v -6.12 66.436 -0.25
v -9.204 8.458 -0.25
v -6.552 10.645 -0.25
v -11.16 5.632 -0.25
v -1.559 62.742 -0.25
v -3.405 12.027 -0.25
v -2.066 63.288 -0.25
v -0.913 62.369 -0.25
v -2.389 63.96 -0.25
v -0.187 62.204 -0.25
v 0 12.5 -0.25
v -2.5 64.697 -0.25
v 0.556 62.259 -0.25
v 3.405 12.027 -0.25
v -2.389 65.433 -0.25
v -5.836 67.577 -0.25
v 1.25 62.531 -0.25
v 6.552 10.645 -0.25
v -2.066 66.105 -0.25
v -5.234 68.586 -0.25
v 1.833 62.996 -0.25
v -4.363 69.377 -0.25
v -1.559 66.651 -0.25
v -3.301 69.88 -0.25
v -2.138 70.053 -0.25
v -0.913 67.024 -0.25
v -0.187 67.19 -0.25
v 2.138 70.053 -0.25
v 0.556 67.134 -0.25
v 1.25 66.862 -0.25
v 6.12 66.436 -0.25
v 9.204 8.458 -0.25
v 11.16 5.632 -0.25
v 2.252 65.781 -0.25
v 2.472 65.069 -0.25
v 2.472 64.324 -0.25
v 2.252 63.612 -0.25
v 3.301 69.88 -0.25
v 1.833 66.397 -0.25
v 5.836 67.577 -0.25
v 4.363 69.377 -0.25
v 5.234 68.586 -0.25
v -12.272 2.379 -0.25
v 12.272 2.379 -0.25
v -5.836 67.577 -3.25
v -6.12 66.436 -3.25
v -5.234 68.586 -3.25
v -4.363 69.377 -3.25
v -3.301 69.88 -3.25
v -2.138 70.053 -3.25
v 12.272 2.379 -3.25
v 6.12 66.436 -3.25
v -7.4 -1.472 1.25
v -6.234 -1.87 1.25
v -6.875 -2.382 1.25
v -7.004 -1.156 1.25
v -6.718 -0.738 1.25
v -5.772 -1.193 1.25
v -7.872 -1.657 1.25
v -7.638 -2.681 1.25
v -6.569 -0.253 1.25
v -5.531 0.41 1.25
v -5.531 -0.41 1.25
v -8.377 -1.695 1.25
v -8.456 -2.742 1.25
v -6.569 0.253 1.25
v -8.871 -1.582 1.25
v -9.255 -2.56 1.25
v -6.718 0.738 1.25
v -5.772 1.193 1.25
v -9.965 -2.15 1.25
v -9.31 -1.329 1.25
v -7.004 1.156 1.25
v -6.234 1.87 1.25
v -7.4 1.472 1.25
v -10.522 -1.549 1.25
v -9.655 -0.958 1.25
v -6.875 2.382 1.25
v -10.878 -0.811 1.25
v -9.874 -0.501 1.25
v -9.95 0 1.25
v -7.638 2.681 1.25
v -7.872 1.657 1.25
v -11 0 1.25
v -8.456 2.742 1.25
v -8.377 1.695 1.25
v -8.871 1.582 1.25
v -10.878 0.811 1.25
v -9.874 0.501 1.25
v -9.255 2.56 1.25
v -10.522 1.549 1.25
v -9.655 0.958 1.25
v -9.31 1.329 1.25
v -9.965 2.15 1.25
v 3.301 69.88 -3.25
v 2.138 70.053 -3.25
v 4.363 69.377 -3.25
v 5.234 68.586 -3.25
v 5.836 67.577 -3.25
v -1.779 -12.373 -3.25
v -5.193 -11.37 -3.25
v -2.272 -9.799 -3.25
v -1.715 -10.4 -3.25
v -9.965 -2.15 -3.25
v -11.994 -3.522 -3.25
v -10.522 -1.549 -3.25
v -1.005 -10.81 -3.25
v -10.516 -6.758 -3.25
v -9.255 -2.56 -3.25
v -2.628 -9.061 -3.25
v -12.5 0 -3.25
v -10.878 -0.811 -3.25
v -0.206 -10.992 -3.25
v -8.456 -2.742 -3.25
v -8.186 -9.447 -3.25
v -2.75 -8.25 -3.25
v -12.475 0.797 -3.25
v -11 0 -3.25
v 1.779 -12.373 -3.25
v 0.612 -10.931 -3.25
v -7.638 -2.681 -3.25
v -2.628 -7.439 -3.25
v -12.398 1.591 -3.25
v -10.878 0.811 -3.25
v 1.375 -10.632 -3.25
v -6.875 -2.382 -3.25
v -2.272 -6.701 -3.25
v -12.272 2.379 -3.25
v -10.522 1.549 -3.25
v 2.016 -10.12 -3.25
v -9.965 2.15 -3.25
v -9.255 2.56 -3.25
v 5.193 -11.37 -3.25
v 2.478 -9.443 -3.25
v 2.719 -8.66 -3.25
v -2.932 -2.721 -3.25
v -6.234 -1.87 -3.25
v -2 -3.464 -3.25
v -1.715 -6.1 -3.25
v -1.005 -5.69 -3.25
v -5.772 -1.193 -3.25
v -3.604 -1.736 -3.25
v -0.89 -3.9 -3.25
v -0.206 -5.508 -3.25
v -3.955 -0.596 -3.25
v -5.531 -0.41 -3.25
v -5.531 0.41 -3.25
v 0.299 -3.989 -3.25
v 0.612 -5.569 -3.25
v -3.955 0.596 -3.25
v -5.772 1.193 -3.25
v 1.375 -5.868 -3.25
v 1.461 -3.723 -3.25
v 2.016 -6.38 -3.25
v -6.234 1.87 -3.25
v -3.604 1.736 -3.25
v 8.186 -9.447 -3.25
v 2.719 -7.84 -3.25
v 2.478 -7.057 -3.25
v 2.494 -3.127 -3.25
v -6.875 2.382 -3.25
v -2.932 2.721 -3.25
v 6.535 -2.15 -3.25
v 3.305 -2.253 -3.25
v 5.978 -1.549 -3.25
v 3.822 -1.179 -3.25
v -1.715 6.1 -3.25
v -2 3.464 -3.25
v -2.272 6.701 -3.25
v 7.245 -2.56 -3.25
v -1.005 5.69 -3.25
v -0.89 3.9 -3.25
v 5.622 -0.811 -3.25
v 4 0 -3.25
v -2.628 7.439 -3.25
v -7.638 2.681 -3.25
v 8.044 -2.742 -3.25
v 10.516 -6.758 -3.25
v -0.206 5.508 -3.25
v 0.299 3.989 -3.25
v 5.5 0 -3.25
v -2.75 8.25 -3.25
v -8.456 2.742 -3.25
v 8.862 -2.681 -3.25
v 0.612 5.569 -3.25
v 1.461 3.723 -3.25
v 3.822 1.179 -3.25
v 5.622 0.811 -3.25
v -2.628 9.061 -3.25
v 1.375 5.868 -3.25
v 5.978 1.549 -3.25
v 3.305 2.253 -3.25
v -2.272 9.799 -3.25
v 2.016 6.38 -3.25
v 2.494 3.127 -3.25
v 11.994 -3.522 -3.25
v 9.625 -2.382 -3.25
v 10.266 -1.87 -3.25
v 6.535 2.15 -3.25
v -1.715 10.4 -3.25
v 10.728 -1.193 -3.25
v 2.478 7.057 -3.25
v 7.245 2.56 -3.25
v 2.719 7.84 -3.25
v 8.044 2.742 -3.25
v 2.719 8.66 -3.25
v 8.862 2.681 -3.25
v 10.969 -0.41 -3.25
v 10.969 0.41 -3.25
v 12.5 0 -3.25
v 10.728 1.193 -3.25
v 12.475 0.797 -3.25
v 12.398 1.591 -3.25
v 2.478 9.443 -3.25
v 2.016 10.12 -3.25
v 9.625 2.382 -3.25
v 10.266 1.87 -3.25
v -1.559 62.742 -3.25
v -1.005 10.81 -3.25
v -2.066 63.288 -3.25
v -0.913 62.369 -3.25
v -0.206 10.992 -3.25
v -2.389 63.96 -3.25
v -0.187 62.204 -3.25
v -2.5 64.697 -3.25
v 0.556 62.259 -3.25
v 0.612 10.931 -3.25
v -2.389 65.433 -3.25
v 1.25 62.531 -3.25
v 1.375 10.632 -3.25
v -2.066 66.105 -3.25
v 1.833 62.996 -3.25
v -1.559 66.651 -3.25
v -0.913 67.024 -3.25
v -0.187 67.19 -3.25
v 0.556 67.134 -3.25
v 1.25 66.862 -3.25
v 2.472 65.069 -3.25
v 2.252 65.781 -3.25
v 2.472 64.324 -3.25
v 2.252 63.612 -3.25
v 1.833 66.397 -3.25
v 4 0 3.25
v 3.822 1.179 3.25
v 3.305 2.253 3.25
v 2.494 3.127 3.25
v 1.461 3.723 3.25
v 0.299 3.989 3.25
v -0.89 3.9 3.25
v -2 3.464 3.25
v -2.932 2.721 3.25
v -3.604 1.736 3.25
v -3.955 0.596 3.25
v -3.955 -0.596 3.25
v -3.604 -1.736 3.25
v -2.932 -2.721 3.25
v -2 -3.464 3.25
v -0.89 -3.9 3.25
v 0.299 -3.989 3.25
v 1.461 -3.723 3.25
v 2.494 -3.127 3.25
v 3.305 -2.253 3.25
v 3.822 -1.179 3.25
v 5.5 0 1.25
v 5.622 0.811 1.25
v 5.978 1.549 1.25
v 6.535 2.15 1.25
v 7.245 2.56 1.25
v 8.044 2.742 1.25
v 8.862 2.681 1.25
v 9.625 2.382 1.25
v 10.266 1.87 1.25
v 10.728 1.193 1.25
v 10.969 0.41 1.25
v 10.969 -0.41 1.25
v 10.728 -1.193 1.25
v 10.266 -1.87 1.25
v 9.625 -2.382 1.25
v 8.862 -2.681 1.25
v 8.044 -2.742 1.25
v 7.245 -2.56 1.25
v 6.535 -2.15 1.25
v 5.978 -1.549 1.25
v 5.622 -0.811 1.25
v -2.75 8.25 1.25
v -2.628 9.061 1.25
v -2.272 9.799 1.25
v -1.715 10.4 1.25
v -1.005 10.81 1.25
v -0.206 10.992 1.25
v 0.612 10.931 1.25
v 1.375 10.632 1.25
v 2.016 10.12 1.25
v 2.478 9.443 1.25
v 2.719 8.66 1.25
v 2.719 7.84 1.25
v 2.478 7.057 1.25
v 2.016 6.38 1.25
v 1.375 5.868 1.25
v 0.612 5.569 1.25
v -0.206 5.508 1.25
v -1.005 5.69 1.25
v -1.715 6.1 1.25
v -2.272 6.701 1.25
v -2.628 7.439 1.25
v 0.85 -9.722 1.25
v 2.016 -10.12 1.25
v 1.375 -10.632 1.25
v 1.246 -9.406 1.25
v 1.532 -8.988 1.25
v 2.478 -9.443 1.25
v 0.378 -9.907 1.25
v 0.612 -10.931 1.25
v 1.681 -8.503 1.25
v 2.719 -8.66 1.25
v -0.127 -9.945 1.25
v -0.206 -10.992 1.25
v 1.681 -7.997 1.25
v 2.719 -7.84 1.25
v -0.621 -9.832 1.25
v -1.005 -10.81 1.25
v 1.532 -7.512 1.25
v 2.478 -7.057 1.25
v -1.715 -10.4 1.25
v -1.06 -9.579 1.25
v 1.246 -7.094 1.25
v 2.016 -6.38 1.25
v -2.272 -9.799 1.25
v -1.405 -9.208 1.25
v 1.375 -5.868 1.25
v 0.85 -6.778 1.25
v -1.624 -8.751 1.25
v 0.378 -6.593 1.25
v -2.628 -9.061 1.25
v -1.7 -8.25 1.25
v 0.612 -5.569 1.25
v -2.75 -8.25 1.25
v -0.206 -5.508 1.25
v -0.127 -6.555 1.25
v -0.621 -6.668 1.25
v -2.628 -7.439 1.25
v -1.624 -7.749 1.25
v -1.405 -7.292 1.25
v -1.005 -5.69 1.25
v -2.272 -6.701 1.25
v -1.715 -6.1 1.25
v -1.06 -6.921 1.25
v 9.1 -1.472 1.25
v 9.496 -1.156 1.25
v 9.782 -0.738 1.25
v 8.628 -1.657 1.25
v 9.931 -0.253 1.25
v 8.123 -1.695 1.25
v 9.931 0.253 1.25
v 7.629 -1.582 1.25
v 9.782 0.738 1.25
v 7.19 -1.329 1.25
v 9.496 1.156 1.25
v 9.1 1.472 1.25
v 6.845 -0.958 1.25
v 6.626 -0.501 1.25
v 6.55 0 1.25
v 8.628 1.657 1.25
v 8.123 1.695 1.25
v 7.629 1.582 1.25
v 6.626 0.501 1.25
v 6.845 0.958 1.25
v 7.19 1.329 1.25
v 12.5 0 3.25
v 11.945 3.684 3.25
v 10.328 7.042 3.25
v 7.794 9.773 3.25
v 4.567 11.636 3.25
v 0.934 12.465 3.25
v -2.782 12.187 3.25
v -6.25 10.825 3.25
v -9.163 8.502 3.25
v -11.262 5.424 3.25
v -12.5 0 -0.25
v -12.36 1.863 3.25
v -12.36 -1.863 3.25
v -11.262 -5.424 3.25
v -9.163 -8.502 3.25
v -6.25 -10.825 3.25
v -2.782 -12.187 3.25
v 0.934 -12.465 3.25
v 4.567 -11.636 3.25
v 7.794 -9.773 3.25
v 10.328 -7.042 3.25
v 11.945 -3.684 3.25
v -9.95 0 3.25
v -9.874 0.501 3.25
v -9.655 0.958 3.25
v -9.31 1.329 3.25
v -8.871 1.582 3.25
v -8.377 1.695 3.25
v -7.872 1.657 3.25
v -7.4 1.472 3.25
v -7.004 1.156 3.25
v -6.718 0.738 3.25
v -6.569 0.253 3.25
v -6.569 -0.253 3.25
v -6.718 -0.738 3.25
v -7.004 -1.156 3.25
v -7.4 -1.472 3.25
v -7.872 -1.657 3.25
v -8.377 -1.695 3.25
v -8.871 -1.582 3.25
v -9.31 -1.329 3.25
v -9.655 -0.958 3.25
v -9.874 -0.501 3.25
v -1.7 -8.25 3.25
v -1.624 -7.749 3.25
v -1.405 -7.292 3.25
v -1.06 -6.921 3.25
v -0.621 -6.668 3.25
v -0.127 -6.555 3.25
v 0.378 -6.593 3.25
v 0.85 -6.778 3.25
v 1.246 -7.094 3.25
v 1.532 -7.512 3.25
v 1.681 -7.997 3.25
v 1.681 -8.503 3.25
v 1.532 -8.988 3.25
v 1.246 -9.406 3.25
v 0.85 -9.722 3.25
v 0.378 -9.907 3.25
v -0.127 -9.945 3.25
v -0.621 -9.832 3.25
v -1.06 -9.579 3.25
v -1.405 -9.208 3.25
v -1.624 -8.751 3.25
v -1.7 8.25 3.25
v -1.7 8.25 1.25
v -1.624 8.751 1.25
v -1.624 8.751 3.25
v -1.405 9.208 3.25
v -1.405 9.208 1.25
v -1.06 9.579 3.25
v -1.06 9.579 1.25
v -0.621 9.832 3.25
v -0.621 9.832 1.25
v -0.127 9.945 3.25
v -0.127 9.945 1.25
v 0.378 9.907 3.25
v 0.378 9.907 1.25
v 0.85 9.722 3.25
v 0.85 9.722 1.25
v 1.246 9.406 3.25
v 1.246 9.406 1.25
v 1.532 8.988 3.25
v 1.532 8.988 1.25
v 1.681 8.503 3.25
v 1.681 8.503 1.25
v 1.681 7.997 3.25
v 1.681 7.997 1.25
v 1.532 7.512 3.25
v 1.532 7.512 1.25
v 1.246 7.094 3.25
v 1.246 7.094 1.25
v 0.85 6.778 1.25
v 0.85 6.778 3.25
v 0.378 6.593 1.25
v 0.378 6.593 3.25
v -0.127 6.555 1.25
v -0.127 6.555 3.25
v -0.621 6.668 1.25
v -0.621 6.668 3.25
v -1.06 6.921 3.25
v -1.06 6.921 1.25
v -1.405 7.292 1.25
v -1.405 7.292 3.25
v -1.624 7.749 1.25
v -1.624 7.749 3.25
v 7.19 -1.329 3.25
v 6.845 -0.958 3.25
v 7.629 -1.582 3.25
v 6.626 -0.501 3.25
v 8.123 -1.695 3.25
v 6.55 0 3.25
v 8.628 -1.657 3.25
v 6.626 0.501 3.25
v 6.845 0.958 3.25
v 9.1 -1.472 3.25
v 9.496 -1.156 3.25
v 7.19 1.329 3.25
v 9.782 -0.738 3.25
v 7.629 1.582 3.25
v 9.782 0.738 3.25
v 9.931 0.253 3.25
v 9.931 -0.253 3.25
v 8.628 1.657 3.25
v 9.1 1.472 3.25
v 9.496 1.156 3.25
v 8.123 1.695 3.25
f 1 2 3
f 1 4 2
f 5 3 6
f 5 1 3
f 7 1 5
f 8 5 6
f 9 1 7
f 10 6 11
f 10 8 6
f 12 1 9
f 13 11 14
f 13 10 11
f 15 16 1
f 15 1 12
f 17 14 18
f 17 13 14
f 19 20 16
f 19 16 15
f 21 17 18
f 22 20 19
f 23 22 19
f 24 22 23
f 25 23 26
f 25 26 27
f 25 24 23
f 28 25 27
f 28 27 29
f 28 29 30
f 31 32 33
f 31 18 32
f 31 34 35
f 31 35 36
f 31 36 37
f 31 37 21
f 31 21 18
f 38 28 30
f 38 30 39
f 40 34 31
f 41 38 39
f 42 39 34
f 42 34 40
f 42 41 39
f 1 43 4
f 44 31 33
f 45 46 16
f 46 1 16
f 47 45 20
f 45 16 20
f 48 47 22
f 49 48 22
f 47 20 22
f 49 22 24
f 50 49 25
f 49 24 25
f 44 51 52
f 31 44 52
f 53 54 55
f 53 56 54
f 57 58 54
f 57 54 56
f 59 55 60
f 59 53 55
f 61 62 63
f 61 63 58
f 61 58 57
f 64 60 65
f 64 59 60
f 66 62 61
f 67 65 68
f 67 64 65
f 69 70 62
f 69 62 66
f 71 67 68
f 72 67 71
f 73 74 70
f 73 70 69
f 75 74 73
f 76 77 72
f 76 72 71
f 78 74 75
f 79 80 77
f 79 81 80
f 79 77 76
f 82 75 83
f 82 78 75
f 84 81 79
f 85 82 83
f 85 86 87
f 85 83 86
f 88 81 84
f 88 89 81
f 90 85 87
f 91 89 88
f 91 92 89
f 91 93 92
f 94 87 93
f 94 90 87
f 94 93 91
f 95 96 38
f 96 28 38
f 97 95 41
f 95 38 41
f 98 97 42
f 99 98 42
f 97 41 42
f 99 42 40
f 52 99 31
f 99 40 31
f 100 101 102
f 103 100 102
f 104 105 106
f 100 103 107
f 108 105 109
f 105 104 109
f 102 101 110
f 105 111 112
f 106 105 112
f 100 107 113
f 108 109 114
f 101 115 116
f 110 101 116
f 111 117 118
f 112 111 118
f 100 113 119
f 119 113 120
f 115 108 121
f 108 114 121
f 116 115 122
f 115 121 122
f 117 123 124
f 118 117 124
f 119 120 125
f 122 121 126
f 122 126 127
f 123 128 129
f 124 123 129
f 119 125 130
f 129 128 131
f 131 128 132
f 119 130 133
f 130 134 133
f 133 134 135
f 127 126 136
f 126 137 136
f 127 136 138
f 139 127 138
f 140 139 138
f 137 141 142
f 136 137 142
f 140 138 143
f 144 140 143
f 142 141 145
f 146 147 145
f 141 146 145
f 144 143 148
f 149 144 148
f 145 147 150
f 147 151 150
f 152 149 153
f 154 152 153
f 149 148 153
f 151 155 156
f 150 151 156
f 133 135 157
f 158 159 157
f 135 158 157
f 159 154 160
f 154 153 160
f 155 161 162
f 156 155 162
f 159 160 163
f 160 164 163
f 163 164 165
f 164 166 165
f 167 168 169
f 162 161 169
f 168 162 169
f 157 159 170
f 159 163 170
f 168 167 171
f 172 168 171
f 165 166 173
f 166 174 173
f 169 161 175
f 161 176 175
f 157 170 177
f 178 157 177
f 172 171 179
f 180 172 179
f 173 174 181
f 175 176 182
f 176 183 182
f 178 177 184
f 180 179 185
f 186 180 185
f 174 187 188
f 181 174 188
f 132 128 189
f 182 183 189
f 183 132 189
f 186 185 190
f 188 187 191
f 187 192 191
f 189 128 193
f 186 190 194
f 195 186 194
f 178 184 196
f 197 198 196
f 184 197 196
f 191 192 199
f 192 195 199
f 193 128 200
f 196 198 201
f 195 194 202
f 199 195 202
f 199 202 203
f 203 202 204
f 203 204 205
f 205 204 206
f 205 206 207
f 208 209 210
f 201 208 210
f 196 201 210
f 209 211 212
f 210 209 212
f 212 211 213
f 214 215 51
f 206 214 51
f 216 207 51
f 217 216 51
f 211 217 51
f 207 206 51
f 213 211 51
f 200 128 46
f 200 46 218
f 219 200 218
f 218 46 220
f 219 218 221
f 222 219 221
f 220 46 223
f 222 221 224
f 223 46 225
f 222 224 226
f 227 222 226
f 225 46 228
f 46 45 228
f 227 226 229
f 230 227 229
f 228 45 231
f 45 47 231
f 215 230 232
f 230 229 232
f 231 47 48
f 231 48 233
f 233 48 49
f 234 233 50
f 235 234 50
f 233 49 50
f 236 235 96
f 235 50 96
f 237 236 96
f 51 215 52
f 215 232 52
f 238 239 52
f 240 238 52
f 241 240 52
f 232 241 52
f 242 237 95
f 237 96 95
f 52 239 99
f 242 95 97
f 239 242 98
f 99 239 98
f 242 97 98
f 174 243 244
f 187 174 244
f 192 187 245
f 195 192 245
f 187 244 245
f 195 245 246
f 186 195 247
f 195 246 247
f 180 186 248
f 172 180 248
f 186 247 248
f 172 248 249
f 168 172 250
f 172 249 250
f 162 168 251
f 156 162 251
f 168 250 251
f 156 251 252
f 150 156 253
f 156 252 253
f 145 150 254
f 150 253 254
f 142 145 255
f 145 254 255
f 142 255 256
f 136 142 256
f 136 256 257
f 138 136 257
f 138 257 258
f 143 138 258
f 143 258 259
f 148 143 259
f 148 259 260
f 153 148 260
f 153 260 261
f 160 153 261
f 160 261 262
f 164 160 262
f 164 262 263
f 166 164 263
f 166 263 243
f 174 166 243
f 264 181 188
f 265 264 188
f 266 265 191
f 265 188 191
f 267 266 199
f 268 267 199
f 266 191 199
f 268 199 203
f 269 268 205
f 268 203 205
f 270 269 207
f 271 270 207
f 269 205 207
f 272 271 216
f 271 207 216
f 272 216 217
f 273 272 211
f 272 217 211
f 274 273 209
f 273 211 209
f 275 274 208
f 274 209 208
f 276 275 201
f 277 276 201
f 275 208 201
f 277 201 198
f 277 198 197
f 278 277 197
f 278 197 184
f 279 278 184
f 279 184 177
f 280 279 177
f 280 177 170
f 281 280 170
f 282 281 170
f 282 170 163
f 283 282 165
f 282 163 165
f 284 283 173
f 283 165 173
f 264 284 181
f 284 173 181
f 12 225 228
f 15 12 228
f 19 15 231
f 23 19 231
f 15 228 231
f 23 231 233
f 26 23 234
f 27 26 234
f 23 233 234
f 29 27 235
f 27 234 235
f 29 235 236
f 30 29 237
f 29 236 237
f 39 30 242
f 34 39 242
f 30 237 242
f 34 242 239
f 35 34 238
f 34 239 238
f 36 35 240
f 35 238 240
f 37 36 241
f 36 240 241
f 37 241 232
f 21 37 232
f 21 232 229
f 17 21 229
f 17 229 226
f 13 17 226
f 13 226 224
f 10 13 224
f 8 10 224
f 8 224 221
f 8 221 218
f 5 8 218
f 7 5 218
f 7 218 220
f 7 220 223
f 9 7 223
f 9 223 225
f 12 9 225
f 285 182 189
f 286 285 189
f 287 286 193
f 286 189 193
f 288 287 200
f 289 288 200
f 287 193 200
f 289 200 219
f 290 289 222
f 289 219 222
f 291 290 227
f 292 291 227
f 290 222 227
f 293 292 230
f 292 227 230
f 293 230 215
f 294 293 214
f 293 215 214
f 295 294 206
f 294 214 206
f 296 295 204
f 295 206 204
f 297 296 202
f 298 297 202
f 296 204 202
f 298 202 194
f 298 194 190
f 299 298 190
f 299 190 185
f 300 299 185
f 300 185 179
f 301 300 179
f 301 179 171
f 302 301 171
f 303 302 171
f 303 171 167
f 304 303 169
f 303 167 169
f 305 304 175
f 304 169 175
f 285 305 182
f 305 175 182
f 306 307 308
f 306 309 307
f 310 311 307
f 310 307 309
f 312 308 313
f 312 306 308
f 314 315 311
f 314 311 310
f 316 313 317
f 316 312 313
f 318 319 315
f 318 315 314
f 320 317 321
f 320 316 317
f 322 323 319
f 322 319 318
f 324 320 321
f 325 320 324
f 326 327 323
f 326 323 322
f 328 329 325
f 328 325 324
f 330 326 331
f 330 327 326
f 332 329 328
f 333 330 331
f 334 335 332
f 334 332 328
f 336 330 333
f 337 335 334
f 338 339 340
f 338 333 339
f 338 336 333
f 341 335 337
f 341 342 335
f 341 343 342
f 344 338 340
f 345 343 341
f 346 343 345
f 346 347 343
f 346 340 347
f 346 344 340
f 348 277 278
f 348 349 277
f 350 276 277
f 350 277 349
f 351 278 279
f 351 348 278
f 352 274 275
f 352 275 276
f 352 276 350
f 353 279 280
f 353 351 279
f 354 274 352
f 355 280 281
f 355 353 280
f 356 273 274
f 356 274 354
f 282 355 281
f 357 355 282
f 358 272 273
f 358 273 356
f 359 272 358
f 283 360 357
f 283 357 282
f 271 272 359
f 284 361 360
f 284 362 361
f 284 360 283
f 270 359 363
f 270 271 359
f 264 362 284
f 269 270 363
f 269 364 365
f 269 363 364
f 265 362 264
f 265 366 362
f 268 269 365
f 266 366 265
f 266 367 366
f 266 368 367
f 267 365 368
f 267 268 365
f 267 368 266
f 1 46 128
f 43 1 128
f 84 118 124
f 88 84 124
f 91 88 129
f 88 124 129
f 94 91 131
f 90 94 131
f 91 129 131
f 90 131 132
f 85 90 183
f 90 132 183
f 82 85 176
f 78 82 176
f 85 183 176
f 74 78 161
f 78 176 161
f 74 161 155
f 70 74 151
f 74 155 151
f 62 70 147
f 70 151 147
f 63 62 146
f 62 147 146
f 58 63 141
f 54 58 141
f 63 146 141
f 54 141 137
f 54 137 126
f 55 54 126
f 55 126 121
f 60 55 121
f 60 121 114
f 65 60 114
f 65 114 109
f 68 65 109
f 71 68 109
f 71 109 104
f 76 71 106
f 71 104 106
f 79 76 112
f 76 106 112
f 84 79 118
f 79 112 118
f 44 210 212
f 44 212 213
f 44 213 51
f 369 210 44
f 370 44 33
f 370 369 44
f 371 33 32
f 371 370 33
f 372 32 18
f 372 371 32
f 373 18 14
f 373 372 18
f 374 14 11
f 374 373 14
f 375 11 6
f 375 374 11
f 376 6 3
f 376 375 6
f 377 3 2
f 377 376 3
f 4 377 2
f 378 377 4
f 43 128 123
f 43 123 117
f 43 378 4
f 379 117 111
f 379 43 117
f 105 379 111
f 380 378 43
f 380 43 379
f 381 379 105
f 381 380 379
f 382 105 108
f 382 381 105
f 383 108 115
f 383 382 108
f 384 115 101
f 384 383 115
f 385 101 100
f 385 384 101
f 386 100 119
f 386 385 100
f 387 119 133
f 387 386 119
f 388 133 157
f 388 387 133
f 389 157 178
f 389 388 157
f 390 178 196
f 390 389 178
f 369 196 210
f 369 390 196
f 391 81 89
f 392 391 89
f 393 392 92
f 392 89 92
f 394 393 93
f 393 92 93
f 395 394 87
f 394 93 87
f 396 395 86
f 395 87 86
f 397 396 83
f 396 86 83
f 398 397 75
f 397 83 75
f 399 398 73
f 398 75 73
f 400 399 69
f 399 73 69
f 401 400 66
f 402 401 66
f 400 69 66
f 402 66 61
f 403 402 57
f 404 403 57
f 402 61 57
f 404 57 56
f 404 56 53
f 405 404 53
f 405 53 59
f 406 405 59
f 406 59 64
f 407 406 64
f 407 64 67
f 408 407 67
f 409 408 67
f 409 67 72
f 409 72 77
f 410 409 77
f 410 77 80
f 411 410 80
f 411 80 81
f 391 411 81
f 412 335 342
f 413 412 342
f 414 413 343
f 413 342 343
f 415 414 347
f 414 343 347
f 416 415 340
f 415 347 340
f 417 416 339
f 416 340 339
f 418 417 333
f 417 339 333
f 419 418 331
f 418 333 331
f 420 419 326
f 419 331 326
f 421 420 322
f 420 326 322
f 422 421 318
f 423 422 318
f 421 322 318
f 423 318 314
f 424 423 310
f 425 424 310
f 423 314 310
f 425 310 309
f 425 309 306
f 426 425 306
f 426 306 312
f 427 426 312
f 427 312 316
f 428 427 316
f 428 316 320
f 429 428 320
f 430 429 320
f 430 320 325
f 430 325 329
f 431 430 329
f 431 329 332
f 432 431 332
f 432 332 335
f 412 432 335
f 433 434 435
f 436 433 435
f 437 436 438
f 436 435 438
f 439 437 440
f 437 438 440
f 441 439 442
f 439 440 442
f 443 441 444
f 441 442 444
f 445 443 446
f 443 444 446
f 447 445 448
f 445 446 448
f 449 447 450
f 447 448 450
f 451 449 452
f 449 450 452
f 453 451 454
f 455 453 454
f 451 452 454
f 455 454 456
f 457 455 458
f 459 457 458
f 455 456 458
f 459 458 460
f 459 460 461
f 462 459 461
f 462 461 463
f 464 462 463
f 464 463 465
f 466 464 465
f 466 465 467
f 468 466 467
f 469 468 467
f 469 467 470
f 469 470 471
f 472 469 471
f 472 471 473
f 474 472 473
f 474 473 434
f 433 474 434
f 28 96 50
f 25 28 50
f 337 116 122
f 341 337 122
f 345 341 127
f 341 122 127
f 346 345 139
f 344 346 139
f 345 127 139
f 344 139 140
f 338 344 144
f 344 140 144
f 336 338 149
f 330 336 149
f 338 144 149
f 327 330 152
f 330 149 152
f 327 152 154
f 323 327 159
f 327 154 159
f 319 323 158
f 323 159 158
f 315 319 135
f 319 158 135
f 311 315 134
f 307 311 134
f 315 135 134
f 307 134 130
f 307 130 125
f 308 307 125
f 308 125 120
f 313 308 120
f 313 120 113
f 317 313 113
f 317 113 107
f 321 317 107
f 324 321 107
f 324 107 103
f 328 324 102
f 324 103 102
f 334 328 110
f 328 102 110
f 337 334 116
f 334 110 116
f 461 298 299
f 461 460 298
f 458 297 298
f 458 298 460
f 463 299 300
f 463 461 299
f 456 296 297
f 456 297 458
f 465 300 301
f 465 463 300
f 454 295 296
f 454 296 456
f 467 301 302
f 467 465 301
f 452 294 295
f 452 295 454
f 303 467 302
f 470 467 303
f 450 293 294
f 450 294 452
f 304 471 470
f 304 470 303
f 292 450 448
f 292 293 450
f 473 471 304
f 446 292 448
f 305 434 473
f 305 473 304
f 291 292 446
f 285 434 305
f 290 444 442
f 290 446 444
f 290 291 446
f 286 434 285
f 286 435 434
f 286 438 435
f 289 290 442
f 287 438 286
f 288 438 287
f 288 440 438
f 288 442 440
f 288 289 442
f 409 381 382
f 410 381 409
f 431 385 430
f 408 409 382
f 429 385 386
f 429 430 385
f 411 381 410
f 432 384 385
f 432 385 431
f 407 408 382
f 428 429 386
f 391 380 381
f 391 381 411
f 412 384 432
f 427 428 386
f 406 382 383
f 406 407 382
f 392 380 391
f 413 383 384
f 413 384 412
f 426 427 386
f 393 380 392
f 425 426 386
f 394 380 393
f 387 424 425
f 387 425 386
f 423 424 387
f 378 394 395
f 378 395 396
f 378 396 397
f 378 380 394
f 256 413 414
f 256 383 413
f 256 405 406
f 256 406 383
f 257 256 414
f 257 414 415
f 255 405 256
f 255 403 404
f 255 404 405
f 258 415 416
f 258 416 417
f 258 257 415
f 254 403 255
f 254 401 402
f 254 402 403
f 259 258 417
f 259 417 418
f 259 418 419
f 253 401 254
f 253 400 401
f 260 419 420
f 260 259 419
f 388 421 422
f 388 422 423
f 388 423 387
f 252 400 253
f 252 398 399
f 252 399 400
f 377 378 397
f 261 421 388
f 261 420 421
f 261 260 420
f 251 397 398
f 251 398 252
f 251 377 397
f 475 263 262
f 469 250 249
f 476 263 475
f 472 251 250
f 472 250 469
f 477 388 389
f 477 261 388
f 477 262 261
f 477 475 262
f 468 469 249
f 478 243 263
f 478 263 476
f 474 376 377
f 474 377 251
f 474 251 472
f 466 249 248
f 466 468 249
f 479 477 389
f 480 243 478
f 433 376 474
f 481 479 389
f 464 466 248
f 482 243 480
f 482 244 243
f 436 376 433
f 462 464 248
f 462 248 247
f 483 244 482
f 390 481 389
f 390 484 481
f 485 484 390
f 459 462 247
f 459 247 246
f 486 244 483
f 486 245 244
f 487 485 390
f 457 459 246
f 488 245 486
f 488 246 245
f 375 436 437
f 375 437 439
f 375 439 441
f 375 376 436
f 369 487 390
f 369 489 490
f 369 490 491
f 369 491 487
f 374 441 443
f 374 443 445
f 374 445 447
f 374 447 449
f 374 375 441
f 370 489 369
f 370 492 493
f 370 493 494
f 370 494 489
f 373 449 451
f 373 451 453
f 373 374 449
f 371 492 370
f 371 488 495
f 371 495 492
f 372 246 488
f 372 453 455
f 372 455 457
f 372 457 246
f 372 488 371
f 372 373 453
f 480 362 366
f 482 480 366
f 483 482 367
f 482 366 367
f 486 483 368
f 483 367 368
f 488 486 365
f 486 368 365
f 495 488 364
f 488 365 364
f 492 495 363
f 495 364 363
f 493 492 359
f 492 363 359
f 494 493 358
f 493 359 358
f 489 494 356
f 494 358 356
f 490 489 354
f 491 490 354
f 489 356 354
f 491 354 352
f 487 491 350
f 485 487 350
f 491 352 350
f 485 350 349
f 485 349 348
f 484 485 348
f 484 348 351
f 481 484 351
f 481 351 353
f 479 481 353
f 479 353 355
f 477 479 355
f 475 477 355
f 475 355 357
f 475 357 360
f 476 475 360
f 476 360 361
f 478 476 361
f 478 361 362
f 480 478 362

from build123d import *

# Parameters (mm, degrees)
ESQUISSE2_R                  = 12.5
BOSS_EXTRU_1_DEPTH           = 3.25
ESQUISSE3_R                  = 1.2
ENL_V_MAT_EXTRU_1_DEPTH      = 4.25
BOSS_EXTRU_2_DEPTH           = 3
ESQUISSE10_R                 = 1.7
ENL_V_MAT_EXTRU_2_DEPTH      = 1
ENL_V_MAT_EXTRU_2_DEPTH_BACK = 7.5
ESQUISSE17_R                 = 4
ENL_V_MAT_EXTRU_8_DEPTH      = 7.5
CONG_1_R                     = 4
ESQUISSE21_R                 = 2.5
ENL_V_MAT_EXTRU_9_DEPTH      = 7.5
SKETCH2_R                    = 2.75
CUT_EXTRUDE2_DEPTH           = 4.5


with BuildPart() as part:
    # Esquisse2 → Boss.-Extru.1 (new body, symmetric)
    with BuildSketch(Plane.XY):
        Circle(ESQUISSE2_R)
    extrude(amount=BOSS_EXTRU_1_DEPTH, both=True)

    # Esquisse3 → Enlèv. mat.-Extru.1 (cut, through all)
    with BuildSketch(Plane.XY):
        with Locations((0, 8.25)):
            Circle(ESQUISSE3_R)
        with Locations((-8.25, 0)):
            Circle(ESQUISSE3_R)
        with Locations((0, -8.25)):
            Circle(ESQUISSE3_R)
        with Locations((8.25, 0)):
            Circle(ESQUISSE3_R)
    extrude(amount=ENL_V_MAT_EXTRU_1_DEPTH, mode=Mode.SUBTRACT)

    # Esquisse20 → Boss.-Extru.2 (add)
    with BuildSketch(Plane(origin=(0, 0, -3.25), x_dir=(-1, 0, 0), z_dir=(0, 0, -1))):
        Polygon((-12.5, 0), (-5.772196938, 70.05324764), (5.772196938, 70.05324764), (12.5, 0), align=None)
    extrude(amount=-BOSS_EXTRU_2_DEPTH)

    # Esquisse10 → Enlèv. mat.-Extru.2 (cut, two sides)
    with BuildSketch(Plane(origin=(0, 0, -3.25), x_dir=(-1, 0, 0), z_dir=(0, 0, -1))) as enl_v_mat_extru_2_sk:
        with Locations((-8.25, 0)):
            Circle(ESQUISSE10_R)
        with Locations((0, 8.25)):
            Circle(ESQUISSE10_R)
        with Locations((8.25, 0)):
            Circle(ESQUISSE10_R)
        with Locations((0, -8.25)):
            Circle(ESQUISSE10_R)
    extrude(amount=ENL_V_MAT_EXTRU_2_DEPTH, mode=Mode.SUBTRACT)
    extrude(enl_v_mat_extru_2_sk.sketch, amount=-ENL_V_MAT_EXTRU_2_DEPTH_BACK, mode=Mode.SUBTRACT)

    # Esquisse17 → Enlèv. mat.-Extru.8 (cut, through all)
    with BuildSketch(Plane.XY.offset(3.25)):
        Circle(ESQUISSE17_R)
    extrude(amount=-ENL_V_MAT_EXTRU_8_DEPTH, mode=Mode.SUBTRACT)

    # Congé1
    cong_1_edges = [part.edges().sort_by_distance(p)[0] for p in [
        (-5.772196938, 70.05324764, -1.75),
        (5.772196938, 70.05324764, -1.75),
    ]]
    fillet(cong_1_edges, radius=CONG_1_R)

    # Esquisse21 → Enlèv. mat.-Extru.9 (cut, through all)
    with BuildSketch(Plane(origin=(0, 0, -3.25), x_dir=(-1, 0, 0), z_dir=(0, 0, -1))):
        with Locations((0, 64.696529063)):
            Circle(ESQUISSE21_R)
    extrude(amount=-ENL_V_MAT_EXTRU_9_DEPTH, mode=Mode.SUBTRACT)

    # Sketch2 → Cut-Extrude2 (cut)
    with BuildSketch(Plane(origin=(0, 0, -3.25), x_dir=(-1, 0, 0), z_dir=(0, 0, -1))):
        with Locations((0, 8.25)):
            Circle(SKETCH2_R)
        with Locations((8.25, 0)):
            Circle(SKETCH2_R)
        with Locations((-8.25, 0)):
            Circle(SKETCH2_R)
        with Locations((0, -8.25)):
            Circle(SKETCH2_R)
    extrude(amount=-CUT_EXTRUDE2_DEPTH, mode=Mode.SUBTRACT)


solid = part.part
